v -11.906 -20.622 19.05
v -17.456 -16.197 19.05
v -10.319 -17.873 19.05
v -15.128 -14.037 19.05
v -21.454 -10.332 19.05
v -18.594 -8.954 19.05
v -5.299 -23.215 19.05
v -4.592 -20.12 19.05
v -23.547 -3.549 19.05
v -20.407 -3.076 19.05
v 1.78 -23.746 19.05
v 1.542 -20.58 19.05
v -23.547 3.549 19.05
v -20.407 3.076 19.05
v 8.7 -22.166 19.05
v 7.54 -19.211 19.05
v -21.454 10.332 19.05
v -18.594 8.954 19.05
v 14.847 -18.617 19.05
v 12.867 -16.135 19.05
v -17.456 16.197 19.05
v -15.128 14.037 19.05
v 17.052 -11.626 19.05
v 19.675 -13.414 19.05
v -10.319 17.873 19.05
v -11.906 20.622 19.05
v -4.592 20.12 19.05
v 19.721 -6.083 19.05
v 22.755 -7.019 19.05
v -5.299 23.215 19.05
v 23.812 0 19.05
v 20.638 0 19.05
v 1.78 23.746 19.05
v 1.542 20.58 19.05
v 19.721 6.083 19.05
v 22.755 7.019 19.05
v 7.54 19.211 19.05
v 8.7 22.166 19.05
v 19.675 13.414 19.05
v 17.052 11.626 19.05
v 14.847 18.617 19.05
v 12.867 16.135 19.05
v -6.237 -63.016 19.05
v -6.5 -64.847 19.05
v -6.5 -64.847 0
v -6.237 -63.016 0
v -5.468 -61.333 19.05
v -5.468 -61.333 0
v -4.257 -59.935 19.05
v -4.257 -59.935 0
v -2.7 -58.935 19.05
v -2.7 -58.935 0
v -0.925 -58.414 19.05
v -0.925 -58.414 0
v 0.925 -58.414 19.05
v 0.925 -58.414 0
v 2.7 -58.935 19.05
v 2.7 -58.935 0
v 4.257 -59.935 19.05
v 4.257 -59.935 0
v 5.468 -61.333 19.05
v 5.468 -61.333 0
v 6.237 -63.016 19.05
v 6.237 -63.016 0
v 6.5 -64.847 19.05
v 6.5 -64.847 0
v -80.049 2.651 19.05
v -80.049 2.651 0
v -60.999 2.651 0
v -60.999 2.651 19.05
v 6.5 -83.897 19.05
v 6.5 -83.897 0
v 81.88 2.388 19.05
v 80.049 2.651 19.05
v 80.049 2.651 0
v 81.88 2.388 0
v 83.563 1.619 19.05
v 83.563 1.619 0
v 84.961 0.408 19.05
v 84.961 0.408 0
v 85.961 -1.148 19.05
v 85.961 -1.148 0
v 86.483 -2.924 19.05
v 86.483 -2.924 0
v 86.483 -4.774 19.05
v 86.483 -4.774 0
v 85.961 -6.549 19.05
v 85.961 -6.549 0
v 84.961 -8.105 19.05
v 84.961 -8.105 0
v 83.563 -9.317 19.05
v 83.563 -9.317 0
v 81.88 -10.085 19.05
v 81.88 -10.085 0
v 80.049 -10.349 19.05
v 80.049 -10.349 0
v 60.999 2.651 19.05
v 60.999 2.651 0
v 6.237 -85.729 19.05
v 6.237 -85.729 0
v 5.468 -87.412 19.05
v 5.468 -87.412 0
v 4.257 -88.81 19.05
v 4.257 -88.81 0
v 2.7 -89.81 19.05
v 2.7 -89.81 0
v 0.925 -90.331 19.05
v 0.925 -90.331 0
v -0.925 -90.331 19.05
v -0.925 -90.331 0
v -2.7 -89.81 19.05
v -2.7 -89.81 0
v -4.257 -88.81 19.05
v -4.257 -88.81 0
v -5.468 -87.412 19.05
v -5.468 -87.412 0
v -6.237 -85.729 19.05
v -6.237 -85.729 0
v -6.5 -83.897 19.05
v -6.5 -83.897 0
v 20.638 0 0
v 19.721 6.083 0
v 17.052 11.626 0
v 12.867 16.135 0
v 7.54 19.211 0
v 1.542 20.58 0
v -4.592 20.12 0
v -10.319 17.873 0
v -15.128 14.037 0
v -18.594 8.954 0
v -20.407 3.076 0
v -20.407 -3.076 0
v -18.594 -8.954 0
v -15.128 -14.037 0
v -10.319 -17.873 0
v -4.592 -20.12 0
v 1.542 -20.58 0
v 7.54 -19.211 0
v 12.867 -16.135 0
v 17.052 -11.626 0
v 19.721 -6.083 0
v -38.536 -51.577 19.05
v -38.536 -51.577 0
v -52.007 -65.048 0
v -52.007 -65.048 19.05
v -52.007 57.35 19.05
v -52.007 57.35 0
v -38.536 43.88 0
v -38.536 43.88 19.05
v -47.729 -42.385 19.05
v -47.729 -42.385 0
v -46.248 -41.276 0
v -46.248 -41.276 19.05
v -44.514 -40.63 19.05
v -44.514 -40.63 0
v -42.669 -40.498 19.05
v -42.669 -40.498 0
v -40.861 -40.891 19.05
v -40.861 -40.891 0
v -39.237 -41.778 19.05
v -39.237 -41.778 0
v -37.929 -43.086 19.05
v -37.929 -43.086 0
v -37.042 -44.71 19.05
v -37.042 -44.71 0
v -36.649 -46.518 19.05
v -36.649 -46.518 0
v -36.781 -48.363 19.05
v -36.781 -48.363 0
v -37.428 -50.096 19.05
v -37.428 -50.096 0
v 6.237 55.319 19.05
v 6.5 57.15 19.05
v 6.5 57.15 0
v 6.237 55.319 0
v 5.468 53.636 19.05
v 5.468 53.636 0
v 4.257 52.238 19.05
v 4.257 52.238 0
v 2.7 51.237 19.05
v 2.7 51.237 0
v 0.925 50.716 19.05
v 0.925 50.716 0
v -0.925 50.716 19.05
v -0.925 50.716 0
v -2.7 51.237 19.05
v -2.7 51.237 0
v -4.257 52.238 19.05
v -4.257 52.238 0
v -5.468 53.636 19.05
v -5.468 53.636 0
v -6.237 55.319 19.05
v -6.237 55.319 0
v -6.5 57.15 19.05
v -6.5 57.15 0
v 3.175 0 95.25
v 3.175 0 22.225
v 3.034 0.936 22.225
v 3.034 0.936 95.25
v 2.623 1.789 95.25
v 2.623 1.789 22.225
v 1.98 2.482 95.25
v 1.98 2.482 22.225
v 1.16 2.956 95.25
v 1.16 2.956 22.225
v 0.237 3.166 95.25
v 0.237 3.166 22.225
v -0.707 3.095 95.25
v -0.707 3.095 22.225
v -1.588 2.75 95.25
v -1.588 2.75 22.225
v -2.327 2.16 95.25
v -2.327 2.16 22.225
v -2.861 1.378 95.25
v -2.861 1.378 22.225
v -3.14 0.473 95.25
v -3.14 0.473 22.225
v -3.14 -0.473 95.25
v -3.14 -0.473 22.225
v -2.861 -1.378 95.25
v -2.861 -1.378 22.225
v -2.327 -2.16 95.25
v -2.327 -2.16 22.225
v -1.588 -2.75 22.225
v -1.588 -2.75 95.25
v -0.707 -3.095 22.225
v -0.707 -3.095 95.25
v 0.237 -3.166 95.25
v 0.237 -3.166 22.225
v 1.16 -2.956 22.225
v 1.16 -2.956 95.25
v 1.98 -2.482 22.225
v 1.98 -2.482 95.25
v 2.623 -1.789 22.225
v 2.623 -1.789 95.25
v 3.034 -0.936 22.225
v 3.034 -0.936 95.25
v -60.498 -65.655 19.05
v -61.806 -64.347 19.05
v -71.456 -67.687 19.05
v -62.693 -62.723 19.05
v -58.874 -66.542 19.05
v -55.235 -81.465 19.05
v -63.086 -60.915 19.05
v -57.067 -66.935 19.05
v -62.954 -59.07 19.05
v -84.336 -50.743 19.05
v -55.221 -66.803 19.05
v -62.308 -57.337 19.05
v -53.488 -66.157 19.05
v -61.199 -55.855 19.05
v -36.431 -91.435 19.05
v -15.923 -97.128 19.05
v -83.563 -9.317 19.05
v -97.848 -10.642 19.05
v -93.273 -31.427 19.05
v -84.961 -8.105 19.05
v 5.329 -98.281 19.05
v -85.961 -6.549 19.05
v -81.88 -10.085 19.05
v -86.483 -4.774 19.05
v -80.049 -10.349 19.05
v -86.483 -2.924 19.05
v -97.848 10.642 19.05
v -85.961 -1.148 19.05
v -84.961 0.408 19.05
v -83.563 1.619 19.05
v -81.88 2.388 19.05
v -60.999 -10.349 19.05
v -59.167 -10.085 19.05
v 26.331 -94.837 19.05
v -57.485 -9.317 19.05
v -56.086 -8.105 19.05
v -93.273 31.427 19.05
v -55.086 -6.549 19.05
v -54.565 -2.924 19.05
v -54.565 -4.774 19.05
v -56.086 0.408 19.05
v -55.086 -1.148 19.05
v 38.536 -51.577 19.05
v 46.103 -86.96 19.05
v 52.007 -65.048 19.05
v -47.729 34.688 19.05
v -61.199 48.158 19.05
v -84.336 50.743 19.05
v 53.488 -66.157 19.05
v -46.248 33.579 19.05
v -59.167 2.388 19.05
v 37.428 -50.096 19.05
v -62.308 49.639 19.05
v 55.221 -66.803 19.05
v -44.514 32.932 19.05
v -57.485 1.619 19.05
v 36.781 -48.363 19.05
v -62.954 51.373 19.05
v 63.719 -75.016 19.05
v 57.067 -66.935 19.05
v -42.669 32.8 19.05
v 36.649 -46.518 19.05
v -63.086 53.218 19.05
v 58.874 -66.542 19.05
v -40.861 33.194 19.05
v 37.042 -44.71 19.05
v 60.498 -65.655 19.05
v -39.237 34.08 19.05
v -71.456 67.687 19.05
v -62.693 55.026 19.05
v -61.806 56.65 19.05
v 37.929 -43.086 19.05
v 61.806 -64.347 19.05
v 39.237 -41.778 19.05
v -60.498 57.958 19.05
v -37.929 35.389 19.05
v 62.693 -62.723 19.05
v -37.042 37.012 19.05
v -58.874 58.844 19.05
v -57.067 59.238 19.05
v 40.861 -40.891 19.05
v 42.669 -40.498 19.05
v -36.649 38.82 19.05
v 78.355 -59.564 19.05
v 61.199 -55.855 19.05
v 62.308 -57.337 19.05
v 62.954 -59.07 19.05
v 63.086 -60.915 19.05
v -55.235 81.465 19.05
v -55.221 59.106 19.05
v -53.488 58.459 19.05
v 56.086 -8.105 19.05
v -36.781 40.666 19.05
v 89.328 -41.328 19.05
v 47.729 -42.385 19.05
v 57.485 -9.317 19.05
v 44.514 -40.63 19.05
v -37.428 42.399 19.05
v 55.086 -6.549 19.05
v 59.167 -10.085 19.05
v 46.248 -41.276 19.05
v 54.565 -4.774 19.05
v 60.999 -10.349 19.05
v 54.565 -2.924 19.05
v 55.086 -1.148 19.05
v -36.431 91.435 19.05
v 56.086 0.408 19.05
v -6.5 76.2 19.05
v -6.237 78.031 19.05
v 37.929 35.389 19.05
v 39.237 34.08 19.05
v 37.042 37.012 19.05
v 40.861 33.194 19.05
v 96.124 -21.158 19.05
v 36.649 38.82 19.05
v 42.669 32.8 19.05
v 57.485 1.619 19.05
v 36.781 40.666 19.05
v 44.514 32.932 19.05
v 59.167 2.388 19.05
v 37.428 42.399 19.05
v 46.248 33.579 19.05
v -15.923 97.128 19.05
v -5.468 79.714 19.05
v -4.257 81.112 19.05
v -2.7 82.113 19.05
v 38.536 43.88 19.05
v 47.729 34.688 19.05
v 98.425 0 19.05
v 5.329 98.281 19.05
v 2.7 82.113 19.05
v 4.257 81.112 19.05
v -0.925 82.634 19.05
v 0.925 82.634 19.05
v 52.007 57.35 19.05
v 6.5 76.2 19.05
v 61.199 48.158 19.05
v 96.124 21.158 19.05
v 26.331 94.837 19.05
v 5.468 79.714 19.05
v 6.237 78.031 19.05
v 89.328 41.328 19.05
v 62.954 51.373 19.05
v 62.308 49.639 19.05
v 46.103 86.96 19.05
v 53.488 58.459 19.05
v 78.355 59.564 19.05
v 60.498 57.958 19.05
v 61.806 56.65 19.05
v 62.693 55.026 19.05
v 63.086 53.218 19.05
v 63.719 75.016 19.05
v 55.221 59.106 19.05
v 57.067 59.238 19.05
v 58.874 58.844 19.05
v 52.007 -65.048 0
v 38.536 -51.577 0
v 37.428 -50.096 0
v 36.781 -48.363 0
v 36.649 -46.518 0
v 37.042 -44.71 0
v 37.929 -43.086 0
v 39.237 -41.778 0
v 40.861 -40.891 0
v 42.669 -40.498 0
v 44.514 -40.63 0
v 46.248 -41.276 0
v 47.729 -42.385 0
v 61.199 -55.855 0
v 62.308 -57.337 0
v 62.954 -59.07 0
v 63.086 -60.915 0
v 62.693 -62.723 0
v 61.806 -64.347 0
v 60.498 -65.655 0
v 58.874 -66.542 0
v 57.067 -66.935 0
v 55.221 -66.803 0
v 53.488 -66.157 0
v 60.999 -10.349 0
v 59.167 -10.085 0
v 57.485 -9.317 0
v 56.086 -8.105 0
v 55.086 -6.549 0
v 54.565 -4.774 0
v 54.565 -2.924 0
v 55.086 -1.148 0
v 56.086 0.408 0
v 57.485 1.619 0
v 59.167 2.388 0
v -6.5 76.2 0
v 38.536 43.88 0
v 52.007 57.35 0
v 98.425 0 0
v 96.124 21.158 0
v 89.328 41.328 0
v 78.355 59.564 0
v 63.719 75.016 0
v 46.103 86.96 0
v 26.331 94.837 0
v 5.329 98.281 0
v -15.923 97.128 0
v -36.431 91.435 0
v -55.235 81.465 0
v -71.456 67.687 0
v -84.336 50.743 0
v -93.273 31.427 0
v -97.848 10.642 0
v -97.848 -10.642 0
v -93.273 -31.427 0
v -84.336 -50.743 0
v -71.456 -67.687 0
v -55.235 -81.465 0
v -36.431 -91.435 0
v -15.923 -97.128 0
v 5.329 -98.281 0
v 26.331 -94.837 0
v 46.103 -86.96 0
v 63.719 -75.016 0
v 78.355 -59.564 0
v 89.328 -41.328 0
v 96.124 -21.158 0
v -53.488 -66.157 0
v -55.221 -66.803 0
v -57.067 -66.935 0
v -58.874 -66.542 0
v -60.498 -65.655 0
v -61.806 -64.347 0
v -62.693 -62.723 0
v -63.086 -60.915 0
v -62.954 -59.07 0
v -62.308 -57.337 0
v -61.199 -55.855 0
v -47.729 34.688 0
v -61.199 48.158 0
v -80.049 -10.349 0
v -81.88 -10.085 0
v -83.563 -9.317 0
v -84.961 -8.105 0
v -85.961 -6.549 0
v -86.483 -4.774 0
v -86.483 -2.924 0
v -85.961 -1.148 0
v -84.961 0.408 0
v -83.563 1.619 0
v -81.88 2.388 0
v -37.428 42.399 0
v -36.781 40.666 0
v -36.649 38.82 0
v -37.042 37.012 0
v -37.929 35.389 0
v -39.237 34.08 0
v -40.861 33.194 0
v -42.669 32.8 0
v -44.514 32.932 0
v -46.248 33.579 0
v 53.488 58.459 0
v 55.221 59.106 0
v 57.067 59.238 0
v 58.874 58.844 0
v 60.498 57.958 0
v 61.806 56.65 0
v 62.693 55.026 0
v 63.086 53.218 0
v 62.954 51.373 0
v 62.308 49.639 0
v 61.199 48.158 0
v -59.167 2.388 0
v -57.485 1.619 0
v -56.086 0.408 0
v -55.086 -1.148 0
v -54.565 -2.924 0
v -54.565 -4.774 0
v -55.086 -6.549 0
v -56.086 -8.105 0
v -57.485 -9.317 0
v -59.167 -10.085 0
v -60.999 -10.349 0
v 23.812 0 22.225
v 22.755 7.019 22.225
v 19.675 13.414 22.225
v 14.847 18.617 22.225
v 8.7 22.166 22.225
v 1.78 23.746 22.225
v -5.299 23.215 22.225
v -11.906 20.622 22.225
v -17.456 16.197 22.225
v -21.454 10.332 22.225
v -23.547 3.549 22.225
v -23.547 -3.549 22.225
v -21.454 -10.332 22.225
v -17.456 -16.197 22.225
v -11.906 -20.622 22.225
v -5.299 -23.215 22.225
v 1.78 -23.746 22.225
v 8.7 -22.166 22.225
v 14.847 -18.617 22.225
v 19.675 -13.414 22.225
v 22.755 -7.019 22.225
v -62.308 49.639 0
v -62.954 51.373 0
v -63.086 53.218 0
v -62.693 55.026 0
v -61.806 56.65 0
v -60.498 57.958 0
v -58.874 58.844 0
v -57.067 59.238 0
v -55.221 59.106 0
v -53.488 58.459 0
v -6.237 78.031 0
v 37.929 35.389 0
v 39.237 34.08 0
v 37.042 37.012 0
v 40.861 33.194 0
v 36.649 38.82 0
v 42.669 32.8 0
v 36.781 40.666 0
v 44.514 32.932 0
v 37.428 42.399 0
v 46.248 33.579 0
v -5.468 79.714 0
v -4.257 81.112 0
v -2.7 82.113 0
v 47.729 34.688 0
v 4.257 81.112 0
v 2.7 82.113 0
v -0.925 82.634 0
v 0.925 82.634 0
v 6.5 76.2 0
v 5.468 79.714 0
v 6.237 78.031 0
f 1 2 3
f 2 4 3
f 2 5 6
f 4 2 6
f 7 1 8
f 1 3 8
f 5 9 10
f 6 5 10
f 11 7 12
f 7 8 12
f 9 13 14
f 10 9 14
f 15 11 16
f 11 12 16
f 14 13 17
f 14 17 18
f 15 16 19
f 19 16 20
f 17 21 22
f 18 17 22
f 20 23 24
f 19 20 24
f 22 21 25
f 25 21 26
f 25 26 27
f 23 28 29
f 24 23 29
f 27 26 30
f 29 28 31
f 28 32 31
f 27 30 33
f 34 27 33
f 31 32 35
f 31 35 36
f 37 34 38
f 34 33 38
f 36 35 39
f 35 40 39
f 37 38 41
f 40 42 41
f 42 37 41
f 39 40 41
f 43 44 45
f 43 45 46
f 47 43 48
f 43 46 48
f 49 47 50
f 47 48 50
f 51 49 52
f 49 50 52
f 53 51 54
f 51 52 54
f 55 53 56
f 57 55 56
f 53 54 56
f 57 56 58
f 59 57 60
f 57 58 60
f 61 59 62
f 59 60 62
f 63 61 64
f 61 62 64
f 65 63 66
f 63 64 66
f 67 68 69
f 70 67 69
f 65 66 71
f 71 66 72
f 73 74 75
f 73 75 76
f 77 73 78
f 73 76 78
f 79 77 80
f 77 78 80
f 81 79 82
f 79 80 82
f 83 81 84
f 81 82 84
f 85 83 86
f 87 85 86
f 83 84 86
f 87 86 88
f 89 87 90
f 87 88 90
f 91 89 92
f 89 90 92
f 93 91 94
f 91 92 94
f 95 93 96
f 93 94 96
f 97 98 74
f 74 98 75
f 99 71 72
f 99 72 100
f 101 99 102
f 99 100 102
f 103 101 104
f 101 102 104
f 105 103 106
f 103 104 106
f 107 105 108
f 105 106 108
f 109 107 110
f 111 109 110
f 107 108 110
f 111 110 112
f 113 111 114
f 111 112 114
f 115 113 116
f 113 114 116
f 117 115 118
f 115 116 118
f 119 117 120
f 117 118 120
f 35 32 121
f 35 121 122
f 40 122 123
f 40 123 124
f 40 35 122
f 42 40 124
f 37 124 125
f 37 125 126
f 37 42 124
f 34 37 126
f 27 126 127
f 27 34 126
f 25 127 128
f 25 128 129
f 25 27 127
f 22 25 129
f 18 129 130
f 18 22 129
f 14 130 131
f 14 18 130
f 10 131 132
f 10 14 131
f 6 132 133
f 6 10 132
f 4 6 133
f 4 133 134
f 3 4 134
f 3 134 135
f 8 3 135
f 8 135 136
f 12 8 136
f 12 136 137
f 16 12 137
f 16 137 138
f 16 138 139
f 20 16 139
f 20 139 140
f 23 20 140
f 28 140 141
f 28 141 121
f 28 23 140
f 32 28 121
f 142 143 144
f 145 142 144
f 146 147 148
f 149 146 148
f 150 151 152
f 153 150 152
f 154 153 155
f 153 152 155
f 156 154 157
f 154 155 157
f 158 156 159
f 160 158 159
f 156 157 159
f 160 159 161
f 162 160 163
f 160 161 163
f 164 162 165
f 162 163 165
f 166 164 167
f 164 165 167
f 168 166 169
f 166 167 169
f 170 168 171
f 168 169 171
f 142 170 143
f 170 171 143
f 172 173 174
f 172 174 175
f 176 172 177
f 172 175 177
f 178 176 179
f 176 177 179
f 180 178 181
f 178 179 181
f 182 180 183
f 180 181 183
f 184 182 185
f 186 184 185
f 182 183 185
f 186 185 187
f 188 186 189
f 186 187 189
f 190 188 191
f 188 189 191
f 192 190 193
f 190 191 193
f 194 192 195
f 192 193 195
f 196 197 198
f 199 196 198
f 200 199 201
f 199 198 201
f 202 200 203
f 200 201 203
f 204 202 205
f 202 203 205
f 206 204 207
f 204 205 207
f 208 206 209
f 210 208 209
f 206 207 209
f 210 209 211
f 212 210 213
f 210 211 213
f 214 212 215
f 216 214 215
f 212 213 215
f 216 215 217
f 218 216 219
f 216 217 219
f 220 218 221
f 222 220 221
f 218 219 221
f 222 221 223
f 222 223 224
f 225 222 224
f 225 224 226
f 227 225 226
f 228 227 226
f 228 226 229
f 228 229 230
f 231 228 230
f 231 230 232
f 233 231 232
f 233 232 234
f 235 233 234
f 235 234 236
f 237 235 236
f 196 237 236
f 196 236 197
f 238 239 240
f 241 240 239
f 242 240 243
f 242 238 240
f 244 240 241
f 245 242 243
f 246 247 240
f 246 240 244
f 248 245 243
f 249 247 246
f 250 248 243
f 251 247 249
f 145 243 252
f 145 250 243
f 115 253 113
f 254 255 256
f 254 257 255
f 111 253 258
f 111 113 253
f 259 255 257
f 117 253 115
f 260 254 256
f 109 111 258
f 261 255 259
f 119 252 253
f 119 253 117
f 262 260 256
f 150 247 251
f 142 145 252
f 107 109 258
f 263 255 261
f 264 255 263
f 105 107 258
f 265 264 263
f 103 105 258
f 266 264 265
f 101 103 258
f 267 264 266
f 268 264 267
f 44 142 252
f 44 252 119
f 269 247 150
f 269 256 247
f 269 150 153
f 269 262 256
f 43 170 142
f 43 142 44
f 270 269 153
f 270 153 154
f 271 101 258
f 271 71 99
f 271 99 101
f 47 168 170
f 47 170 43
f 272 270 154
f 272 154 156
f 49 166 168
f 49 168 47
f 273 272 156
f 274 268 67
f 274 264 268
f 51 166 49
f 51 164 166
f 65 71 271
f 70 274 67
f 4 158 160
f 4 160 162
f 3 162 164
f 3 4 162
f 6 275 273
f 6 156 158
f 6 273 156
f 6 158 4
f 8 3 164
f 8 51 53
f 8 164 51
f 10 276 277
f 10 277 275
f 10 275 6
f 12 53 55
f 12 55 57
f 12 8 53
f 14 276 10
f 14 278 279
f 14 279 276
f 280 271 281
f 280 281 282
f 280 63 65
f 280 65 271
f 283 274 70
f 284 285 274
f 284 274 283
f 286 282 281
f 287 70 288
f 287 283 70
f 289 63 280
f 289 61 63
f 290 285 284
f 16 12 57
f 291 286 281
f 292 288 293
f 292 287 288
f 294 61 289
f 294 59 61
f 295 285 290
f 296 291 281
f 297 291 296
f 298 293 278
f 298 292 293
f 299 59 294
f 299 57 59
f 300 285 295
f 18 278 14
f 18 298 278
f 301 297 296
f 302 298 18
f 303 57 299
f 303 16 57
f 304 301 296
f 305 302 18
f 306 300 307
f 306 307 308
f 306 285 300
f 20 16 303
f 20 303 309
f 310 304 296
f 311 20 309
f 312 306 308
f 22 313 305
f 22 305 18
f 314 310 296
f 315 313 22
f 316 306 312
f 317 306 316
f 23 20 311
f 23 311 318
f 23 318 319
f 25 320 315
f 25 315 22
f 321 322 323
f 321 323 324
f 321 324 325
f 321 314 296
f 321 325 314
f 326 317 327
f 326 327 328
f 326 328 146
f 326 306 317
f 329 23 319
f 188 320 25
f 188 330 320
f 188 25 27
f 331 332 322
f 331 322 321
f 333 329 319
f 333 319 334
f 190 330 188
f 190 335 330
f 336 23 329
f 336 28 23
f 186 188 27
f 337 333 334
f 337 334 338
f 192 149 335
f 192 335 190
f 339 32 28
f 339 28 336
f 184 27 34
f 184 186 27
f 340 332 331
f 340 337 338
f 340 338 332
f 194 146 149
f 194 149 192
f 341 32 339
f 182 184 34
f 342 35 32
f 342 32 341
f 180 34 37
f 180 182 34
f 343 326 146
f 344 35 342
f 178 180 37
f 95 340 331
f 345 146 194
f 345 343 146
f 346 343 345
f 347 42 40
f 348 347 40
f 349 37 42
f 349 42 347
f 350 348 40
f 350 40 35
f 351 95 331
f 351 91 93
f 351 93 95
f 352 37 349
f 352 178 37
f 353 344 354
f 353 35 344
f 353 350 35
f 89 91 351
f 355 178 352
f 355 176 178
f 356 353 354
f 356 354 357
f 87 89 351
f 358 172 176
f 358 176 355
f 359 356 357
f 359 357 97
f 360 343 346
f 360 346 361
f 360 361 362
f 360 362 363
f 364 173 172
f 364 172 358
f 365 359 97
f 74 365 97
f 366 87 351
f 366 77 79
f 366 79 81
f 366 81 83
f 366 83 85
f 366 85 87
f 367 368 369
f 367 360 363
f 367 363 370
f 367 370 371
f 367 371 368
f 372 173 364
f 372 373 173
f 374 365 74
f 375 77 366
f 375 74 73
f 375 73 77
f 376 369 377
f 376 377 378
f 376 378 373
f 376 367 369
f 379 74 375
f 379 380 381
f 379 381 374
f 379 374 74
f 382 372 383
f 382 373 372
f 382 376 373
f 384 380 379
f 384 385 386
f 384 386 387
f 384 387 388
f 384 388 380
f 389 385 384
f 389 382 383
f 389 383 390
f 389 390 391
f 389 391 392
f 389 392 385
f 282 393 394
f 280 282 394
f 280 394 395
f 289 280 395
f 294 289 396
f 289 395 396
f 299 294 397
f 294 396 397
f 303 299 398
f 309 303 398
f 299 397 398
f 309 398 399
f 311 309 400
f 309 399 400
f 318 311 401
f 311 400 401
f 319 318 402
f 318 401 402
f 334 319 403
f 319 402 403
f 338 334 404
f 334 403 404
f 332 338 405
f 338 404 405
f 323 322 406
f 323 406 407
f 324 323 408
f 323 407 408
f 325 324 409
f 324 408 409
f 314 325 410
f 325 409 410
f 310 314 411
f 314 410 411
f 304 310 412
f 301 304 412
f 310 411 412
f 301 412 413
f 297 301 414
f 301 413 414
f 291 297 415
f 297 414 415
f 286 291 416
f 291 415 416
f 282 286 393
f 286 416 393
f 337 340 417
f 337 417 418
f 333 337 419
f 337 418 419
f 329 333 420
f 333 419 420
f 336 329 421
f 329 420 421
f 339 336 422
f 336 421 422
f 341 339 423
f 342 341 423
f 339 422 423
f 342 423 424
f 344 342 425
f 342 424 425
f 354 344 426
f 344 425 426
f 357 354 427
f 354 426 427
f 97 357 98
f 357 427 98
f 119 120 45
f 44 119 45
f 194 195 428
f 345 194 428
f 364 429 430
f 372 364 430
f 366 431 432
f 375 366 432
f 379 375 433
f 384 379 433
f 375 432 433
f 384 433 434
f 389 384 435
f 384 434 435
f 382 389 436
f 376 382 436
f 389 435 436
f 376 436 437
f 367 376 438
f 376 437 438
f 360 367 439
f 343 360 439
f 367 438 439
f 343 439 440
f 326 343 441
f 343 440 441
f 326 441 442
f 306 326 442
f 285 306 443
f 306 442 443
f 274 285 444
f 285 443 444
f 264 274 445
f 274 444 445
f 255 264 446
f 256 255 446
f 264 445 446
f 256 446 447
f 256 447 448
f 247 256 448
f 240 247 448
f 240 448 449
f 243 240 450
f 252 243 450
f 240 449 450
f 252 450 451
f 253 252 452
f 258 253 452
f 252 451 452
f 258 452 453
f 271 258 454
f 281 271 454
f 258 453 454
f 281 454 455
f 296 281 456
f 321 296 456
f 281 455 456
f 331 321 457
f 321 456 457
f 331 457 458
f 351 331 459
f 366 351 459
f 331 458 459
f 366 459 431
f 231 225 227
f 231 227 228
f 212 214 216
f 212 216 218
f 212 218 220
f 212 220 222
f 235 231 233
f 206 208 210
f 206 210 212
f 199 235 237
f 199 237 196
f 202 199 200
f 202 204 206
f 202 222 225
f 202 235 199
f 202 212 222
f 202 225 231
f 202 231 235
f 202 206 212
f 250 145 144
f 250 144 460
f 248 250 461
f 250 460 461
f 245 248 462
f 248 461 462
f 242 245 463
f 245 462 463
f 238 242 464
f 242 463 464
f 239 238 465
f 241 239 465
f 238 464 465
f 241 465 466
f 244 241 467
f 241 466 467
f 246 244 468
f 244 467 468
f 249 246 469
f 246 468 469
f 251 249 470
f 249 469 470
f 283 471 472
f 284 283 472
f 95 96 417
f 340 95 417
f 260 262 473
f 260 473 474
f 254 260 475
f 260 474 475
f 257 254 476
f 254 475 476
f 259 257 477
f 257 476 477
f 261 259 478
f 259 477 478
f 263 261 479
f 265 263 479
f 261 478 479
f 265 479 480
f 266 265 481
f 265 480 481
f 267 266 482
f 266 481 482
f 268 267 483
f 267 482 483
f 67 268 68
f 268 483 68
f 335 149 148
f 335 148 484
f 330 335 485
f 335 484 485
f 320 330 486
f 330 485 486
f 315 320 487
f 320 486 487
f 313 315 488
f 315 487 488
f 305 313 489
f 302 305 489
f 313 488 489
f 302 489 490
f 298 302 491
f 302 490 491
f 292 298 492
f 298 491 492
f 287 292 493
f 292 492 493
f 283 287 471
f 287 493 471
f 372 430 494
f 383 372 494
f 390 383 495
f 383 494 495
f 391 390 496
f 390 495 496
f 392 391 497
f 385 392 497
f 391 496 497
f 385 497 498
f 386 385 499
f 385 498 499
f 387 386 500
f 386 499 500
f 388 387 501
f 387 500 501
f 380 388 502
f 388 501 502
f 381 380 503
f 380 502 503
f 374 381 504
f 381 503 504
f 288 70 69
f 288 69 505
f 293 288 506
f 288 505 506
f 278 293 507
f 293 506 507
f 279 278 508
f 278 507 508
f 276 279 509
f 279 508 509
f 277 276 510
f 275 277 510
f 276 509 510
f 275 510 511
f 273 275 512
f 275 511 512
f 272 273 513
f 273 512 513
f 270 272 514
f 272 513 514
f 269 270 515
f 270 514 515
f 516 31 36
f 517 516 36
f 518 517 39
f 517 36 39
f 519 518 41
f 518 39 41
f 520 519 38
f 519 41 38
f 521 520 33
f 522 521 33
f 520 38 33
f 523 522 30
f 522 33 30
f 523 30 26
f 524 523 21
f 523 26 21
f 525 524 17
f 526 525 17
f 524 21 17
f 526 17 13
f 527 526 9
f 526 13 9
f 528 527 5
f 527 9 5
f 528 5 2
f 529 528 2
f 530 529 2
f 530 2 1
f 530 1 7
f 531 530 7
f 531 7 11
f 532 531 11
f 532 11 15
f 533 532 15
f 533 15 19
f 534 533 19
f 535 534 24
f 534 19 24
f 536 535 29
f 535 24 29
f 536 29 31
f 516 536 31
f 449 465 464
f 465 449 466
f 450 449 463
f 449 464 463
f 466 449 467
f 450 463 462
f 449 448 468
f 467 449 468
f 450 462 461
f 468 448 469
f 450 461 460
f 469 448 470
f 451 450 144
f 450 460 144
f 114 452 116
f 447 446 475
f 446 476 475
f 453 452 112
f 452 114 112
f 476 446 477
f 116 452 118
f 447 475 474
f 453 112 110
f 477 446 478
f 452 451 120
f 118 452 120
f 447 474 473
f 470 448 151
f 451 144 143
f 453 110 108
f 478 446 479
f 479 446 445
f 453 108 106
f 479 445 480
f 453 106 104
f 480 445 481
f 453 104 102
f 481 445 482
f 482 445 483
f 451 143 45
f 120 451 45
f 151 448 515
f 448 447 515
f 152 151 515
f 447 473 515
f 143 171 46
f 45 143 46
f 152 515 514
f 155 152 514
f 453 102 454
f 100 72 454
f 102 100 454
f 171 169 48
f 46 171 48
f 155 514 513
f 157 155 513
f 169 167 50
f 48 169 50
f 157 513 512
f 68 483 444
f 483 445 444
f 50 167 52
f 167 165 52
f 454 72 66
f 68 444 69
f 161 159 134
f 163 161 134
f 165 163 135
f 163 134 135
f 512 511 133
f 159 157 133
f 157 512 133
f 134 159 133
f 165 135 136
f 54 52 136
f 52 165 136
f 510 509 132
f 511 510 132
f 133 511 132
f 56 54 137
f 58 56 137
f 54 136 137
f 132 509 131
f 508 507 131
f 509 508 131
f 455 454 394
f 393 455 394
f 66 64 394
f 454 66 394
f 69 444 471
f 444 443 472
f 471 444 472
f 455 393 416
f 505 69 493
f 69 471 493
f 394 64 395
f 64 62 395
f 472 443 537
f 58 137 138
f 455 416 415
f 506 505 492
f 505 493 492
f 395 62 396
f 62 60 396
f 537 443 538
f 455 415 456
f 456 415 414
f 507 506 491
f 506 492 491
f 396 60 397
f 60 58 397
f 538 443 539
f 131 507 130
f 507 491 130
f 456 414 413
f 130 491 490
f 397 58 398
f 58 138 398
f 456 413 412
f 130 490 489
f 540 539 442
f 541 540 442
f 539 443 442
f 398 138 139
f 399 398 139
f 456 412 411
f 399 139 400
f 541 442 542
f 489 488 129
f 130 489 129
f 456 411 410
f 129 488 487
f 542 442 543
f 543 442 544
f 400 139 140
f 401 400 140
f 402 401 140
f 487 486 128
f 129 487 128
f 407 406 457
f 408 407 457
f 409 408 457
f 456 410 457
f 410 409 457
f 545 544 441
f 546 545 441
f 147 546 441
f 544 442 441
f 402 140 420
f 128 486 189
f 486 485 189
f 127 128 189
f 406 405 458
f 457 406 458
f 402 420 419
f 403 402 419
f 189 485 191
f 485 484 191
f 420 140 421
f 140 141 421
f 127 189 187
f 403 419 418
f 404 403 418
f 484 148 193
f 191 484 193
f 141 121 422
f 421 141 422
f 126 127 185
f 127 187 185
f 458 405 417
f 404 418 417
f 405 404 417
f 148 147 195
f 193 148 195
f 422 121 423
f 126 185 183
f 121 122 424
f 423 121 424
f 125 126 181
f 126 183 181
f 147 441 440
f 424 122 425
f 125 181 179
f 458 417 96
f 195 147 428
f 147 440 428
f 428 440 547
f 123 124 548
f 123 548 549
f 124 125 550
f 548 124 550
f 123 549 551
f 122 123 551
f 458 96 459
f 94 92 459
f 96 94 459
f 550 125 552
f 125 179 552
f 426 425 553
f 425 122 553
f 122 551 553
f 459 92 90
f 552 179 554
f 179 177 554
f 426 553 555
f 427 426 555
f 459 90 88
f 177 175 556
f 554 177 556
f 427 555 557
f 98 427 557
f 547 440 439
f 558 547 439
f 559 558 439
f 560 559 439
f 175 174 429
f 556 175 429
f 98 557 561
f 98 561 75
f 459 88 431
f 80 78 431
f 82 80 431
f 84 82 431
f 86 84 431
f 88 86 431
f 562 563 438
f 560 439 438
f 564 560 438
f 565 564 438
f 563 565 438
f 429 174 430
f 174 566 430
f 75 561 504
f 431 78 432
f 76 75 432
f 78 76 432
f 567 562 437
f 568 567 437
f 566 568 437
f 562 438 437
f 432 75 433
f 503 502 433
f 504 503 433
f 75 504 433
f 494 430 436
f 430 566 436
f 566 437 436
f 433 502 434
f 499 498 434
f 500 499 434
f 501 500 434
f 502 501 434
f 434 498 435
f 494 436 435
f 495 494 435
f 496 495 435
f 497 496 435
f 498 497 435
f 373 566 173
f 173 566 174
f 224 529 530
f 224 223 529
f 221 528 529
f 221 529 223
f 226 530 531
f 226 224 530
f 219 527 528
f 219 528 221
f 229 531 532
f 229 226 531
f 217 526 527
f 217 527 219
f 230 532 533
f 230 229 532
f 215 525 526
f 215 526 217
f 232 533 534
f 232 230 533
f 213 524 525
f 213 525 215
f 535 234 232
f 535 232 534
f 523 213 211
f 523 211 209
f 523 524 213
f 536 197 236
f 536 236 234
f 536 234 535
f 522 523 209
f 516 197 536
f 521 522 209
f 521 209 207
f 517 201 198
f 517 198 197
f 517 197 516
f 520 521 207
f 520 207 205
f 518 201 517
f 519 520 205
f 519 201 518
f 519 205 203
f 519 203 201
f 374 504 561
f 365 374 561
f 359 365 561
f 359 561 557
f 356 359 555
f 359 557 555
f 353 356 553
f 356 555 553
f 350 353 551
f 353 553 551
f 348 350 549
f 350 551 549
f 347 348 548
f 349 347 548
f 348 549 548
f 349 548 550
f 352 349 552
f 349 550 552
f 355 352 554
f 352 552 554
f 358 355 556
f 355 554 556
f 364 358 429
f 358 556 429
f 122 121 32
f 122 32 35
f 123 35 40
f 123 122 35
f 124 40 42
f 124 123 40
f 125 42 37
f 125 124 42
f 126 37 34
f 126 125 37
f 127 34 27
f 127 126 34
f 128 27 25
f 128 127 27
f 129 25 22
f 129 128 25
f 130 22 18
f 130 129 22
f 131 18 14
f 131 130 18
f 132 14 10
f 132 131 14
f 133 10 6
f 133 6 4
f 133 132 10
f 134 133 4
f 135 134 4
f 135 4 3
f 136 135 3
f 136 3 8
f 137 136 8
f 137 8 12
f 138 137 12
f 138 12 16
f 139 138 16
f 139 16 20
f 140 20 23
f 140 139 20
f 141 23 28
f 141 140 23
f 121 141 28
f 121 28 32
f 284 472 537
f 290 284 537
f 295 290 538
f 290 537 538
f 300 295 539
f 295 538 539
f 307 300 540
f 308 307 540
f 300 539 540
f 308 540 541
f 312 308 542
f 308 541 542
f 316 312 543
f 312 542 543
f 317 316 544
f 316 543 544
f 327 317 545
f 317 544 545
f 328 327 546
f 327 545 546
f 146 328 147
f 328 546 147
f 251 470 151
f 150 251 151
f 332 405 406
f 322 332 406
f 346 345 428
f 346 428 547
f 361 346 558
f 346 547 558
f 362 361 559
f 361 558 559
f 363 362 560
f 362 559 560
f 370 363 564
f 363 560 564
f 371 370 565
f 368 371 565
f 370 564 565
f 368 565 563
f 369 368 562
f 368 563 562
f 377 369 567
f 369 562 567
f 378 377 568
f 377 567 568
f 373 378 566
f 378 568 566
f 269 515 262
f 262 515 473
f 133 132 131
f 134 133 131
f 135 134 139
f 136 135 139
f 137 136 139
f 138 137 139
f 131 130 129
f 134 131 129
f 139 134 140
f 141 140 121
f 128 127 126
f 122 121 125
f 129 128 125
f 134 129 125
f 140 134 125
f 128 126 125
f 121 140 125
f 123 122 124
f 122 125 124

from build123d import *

# Parameters (mm, degrees)
F0_R     = 98.425
F0_R_2   = 20.6375
F1_DEPTH = 19.05
F2_R     = 20.6375
F3_DEPTH = 19.05
F4_R     = 3.175
F5_DEPTH = 76.2
F2_R_2   = 23.8125
F6_DEPTH = 3.175


with BuildPart() as f1:
    # F0 (on Top) → F1 (new body)
    with BuildSketch(Plane.XY):
        Circle(F0_R)
        with BuildLine():
            Line((-61.1991593756, -55.8554524149), (-47.728775194, -42.3850682333))
            ThreePointArc((-47.728775194, -42.3850682333), (-38.5363870385, -42.3850682333), (-38.5363870385, -51.5774563887))
            Line((-38.5363870385, -51.5774563887), (-52.0067712201, -65.0478405703))
            ThreePointArc((-52.0067712201, -65.0478405703), (-61.1991593756, -65.0478405703), (-61.1991593756, -55.8554524149))
        make_face(mode=Mode.SUBTRACT)
        with BuildLine():
            Line((-80.0486811947, 2.6513188053), (-60.9986811947, 2.6513188053))
            ThreePointArc((-60.9986811947, 2.6513188053), (-54.4986811947, -3.8486811947), (-60.9986811947, -10.3486811947))
            Line((-60.9986811947, -10.3486811947), (-80.0486811947, -10.3486811947))
            ThreePointArc((-80.0486811947, -10.3486811947), (-86.5486811947, -3.8486811947), (-80.0486811947, 2.6513188053))
        make_face(mode=Mode.SUBTRACT)
        with BuildLine():
            Line((-6.5, -83.8973623895), (-6.5, -64.8473623895))
            ThreePointArc((-6.5, -64.8473623895), (0, -58.3473623895), (6.5, -64.8473623895))
            Line((6.5, -64.8473623895), (6.5, -83.8973623895))
            ThreePointArc((6.5, -83.8973623895), (0, -90.3973623895), (-6.5, -83.8973623895))
        make_face(mode=Mode.SUBTRACT)
        with BuildLine():
            Line((52.0067712201, -65.0478405703), (38.5363870385, -51.5774563887))
            ThreePointArc((38.5363870385, -51.5774563887), (38.5363870385, -42.3850682333), (47.728775194, -42.3850682333))
            Line((47.728775194, -42.3850682333), (61.1991593756, -55.8554524149))
            ThreePointArc((61.1991593756, -55.8554524149), (61.1991593756, -65.0478405703), (52.0067712201, -65.0478405703))
        make_face(mode=Mode.SUBTRACT)
        with BuildLine():
            Line((80.0486811947, -10.3486811947), (60.9986811947, -10.3486811947))
            ThreePointArc((60.9986811947, -10.3486811947), (54.4986811947, -3.8486811947), (60.9986811947, 2.6513188053))
            Line((60.9986811947, 2.6513188053), (80.0486811947, 2.6513188053))
            ThreePointArc((80.0486811947, 2.6513188053), (86.5486811947, -3.8486811947), (80.0486811947, -10.3486811947))
        make_face(mode=Mode.SUBTRACT)
        with BuildLine():
            Line((-52.0067712201, 57.3504781808), (-38.5363870385, 43.8800939992))
            ThreePointArc((-38.5363870385, 43.8800939992), (-38.5363870385, 34.6877058438), (-47.728775194, 34.6877058438))
            Line((-47.728775194, 34.6877058438), (-61.1991593756, 48.1580900254))
            ThreePointArc((-61.1991593756, 48.1580900254), (-61.1991593756, 57.3504781808), (-52.0067712201, 57.3504781808))
        make_face(mode=Mode.SUBTRACT)
        Circle(F0_R_2, mode=Mode.SUBTRACT)
        with BuildLine():
            Line((61.1991593756, 48.1580900254), (47.728775194, 34.6877058438))
            ThreePointArc((47.728775194, 34.6877058438), (38.5363870385, 34.6877058438), (38.5363870385, 43.8800939992))
            Line((38.5363870385, 43.8800939992), (52.0067712201, 57.3504781808))
            ThreePointArc((52.0067712201, 57.3504781808), (61.1991593756, 57.3504781808), (61.1991593756, 48.1580900254))
        make_face(mode=Mode.SUBTRACT)
        with BuildLine():
            Line((6.5, 76.2), (6.5, 57.15))
            ThreePointArc((6.5, 57.15), (0, 50.65), (-6.5, 57.15))
            Line((-6.5, 57.15), (-6.5, 76.2))
            ThreePointArc((-6.5, 76.2), (0, 82.7), (6.5, 76.2))
        make_face(mode=Mode.SUBTRACT)
    extrude(amount=F1_DEPTH)


with BuildPart() as f3:
    # F2 (on face) → F3 (new body, through all)
    with BuildSketch(Plane.XY.offset(19.05)):
        Circle(F2_R)
    extrude(amount=-F3_DEPTH)

    # F4 (on face) → F5 (join)
    with BuildSketch(Plane.XY.offset(19.05)):
        Circle(F4_R)
    extrude(amount=F5_DEPTH)

    # F2 (on face) → F6 (join)
    with BuildSketch(Plane.XY.offset(19.05)):
        Circle(F2_R_2)
        Circle(F2_R, mode=Mode.SUBTRACT)
        Circle(F2_R)
    extrude(amount=F6_DEPTH)


solid = Compound([f1.part, f3.part])
